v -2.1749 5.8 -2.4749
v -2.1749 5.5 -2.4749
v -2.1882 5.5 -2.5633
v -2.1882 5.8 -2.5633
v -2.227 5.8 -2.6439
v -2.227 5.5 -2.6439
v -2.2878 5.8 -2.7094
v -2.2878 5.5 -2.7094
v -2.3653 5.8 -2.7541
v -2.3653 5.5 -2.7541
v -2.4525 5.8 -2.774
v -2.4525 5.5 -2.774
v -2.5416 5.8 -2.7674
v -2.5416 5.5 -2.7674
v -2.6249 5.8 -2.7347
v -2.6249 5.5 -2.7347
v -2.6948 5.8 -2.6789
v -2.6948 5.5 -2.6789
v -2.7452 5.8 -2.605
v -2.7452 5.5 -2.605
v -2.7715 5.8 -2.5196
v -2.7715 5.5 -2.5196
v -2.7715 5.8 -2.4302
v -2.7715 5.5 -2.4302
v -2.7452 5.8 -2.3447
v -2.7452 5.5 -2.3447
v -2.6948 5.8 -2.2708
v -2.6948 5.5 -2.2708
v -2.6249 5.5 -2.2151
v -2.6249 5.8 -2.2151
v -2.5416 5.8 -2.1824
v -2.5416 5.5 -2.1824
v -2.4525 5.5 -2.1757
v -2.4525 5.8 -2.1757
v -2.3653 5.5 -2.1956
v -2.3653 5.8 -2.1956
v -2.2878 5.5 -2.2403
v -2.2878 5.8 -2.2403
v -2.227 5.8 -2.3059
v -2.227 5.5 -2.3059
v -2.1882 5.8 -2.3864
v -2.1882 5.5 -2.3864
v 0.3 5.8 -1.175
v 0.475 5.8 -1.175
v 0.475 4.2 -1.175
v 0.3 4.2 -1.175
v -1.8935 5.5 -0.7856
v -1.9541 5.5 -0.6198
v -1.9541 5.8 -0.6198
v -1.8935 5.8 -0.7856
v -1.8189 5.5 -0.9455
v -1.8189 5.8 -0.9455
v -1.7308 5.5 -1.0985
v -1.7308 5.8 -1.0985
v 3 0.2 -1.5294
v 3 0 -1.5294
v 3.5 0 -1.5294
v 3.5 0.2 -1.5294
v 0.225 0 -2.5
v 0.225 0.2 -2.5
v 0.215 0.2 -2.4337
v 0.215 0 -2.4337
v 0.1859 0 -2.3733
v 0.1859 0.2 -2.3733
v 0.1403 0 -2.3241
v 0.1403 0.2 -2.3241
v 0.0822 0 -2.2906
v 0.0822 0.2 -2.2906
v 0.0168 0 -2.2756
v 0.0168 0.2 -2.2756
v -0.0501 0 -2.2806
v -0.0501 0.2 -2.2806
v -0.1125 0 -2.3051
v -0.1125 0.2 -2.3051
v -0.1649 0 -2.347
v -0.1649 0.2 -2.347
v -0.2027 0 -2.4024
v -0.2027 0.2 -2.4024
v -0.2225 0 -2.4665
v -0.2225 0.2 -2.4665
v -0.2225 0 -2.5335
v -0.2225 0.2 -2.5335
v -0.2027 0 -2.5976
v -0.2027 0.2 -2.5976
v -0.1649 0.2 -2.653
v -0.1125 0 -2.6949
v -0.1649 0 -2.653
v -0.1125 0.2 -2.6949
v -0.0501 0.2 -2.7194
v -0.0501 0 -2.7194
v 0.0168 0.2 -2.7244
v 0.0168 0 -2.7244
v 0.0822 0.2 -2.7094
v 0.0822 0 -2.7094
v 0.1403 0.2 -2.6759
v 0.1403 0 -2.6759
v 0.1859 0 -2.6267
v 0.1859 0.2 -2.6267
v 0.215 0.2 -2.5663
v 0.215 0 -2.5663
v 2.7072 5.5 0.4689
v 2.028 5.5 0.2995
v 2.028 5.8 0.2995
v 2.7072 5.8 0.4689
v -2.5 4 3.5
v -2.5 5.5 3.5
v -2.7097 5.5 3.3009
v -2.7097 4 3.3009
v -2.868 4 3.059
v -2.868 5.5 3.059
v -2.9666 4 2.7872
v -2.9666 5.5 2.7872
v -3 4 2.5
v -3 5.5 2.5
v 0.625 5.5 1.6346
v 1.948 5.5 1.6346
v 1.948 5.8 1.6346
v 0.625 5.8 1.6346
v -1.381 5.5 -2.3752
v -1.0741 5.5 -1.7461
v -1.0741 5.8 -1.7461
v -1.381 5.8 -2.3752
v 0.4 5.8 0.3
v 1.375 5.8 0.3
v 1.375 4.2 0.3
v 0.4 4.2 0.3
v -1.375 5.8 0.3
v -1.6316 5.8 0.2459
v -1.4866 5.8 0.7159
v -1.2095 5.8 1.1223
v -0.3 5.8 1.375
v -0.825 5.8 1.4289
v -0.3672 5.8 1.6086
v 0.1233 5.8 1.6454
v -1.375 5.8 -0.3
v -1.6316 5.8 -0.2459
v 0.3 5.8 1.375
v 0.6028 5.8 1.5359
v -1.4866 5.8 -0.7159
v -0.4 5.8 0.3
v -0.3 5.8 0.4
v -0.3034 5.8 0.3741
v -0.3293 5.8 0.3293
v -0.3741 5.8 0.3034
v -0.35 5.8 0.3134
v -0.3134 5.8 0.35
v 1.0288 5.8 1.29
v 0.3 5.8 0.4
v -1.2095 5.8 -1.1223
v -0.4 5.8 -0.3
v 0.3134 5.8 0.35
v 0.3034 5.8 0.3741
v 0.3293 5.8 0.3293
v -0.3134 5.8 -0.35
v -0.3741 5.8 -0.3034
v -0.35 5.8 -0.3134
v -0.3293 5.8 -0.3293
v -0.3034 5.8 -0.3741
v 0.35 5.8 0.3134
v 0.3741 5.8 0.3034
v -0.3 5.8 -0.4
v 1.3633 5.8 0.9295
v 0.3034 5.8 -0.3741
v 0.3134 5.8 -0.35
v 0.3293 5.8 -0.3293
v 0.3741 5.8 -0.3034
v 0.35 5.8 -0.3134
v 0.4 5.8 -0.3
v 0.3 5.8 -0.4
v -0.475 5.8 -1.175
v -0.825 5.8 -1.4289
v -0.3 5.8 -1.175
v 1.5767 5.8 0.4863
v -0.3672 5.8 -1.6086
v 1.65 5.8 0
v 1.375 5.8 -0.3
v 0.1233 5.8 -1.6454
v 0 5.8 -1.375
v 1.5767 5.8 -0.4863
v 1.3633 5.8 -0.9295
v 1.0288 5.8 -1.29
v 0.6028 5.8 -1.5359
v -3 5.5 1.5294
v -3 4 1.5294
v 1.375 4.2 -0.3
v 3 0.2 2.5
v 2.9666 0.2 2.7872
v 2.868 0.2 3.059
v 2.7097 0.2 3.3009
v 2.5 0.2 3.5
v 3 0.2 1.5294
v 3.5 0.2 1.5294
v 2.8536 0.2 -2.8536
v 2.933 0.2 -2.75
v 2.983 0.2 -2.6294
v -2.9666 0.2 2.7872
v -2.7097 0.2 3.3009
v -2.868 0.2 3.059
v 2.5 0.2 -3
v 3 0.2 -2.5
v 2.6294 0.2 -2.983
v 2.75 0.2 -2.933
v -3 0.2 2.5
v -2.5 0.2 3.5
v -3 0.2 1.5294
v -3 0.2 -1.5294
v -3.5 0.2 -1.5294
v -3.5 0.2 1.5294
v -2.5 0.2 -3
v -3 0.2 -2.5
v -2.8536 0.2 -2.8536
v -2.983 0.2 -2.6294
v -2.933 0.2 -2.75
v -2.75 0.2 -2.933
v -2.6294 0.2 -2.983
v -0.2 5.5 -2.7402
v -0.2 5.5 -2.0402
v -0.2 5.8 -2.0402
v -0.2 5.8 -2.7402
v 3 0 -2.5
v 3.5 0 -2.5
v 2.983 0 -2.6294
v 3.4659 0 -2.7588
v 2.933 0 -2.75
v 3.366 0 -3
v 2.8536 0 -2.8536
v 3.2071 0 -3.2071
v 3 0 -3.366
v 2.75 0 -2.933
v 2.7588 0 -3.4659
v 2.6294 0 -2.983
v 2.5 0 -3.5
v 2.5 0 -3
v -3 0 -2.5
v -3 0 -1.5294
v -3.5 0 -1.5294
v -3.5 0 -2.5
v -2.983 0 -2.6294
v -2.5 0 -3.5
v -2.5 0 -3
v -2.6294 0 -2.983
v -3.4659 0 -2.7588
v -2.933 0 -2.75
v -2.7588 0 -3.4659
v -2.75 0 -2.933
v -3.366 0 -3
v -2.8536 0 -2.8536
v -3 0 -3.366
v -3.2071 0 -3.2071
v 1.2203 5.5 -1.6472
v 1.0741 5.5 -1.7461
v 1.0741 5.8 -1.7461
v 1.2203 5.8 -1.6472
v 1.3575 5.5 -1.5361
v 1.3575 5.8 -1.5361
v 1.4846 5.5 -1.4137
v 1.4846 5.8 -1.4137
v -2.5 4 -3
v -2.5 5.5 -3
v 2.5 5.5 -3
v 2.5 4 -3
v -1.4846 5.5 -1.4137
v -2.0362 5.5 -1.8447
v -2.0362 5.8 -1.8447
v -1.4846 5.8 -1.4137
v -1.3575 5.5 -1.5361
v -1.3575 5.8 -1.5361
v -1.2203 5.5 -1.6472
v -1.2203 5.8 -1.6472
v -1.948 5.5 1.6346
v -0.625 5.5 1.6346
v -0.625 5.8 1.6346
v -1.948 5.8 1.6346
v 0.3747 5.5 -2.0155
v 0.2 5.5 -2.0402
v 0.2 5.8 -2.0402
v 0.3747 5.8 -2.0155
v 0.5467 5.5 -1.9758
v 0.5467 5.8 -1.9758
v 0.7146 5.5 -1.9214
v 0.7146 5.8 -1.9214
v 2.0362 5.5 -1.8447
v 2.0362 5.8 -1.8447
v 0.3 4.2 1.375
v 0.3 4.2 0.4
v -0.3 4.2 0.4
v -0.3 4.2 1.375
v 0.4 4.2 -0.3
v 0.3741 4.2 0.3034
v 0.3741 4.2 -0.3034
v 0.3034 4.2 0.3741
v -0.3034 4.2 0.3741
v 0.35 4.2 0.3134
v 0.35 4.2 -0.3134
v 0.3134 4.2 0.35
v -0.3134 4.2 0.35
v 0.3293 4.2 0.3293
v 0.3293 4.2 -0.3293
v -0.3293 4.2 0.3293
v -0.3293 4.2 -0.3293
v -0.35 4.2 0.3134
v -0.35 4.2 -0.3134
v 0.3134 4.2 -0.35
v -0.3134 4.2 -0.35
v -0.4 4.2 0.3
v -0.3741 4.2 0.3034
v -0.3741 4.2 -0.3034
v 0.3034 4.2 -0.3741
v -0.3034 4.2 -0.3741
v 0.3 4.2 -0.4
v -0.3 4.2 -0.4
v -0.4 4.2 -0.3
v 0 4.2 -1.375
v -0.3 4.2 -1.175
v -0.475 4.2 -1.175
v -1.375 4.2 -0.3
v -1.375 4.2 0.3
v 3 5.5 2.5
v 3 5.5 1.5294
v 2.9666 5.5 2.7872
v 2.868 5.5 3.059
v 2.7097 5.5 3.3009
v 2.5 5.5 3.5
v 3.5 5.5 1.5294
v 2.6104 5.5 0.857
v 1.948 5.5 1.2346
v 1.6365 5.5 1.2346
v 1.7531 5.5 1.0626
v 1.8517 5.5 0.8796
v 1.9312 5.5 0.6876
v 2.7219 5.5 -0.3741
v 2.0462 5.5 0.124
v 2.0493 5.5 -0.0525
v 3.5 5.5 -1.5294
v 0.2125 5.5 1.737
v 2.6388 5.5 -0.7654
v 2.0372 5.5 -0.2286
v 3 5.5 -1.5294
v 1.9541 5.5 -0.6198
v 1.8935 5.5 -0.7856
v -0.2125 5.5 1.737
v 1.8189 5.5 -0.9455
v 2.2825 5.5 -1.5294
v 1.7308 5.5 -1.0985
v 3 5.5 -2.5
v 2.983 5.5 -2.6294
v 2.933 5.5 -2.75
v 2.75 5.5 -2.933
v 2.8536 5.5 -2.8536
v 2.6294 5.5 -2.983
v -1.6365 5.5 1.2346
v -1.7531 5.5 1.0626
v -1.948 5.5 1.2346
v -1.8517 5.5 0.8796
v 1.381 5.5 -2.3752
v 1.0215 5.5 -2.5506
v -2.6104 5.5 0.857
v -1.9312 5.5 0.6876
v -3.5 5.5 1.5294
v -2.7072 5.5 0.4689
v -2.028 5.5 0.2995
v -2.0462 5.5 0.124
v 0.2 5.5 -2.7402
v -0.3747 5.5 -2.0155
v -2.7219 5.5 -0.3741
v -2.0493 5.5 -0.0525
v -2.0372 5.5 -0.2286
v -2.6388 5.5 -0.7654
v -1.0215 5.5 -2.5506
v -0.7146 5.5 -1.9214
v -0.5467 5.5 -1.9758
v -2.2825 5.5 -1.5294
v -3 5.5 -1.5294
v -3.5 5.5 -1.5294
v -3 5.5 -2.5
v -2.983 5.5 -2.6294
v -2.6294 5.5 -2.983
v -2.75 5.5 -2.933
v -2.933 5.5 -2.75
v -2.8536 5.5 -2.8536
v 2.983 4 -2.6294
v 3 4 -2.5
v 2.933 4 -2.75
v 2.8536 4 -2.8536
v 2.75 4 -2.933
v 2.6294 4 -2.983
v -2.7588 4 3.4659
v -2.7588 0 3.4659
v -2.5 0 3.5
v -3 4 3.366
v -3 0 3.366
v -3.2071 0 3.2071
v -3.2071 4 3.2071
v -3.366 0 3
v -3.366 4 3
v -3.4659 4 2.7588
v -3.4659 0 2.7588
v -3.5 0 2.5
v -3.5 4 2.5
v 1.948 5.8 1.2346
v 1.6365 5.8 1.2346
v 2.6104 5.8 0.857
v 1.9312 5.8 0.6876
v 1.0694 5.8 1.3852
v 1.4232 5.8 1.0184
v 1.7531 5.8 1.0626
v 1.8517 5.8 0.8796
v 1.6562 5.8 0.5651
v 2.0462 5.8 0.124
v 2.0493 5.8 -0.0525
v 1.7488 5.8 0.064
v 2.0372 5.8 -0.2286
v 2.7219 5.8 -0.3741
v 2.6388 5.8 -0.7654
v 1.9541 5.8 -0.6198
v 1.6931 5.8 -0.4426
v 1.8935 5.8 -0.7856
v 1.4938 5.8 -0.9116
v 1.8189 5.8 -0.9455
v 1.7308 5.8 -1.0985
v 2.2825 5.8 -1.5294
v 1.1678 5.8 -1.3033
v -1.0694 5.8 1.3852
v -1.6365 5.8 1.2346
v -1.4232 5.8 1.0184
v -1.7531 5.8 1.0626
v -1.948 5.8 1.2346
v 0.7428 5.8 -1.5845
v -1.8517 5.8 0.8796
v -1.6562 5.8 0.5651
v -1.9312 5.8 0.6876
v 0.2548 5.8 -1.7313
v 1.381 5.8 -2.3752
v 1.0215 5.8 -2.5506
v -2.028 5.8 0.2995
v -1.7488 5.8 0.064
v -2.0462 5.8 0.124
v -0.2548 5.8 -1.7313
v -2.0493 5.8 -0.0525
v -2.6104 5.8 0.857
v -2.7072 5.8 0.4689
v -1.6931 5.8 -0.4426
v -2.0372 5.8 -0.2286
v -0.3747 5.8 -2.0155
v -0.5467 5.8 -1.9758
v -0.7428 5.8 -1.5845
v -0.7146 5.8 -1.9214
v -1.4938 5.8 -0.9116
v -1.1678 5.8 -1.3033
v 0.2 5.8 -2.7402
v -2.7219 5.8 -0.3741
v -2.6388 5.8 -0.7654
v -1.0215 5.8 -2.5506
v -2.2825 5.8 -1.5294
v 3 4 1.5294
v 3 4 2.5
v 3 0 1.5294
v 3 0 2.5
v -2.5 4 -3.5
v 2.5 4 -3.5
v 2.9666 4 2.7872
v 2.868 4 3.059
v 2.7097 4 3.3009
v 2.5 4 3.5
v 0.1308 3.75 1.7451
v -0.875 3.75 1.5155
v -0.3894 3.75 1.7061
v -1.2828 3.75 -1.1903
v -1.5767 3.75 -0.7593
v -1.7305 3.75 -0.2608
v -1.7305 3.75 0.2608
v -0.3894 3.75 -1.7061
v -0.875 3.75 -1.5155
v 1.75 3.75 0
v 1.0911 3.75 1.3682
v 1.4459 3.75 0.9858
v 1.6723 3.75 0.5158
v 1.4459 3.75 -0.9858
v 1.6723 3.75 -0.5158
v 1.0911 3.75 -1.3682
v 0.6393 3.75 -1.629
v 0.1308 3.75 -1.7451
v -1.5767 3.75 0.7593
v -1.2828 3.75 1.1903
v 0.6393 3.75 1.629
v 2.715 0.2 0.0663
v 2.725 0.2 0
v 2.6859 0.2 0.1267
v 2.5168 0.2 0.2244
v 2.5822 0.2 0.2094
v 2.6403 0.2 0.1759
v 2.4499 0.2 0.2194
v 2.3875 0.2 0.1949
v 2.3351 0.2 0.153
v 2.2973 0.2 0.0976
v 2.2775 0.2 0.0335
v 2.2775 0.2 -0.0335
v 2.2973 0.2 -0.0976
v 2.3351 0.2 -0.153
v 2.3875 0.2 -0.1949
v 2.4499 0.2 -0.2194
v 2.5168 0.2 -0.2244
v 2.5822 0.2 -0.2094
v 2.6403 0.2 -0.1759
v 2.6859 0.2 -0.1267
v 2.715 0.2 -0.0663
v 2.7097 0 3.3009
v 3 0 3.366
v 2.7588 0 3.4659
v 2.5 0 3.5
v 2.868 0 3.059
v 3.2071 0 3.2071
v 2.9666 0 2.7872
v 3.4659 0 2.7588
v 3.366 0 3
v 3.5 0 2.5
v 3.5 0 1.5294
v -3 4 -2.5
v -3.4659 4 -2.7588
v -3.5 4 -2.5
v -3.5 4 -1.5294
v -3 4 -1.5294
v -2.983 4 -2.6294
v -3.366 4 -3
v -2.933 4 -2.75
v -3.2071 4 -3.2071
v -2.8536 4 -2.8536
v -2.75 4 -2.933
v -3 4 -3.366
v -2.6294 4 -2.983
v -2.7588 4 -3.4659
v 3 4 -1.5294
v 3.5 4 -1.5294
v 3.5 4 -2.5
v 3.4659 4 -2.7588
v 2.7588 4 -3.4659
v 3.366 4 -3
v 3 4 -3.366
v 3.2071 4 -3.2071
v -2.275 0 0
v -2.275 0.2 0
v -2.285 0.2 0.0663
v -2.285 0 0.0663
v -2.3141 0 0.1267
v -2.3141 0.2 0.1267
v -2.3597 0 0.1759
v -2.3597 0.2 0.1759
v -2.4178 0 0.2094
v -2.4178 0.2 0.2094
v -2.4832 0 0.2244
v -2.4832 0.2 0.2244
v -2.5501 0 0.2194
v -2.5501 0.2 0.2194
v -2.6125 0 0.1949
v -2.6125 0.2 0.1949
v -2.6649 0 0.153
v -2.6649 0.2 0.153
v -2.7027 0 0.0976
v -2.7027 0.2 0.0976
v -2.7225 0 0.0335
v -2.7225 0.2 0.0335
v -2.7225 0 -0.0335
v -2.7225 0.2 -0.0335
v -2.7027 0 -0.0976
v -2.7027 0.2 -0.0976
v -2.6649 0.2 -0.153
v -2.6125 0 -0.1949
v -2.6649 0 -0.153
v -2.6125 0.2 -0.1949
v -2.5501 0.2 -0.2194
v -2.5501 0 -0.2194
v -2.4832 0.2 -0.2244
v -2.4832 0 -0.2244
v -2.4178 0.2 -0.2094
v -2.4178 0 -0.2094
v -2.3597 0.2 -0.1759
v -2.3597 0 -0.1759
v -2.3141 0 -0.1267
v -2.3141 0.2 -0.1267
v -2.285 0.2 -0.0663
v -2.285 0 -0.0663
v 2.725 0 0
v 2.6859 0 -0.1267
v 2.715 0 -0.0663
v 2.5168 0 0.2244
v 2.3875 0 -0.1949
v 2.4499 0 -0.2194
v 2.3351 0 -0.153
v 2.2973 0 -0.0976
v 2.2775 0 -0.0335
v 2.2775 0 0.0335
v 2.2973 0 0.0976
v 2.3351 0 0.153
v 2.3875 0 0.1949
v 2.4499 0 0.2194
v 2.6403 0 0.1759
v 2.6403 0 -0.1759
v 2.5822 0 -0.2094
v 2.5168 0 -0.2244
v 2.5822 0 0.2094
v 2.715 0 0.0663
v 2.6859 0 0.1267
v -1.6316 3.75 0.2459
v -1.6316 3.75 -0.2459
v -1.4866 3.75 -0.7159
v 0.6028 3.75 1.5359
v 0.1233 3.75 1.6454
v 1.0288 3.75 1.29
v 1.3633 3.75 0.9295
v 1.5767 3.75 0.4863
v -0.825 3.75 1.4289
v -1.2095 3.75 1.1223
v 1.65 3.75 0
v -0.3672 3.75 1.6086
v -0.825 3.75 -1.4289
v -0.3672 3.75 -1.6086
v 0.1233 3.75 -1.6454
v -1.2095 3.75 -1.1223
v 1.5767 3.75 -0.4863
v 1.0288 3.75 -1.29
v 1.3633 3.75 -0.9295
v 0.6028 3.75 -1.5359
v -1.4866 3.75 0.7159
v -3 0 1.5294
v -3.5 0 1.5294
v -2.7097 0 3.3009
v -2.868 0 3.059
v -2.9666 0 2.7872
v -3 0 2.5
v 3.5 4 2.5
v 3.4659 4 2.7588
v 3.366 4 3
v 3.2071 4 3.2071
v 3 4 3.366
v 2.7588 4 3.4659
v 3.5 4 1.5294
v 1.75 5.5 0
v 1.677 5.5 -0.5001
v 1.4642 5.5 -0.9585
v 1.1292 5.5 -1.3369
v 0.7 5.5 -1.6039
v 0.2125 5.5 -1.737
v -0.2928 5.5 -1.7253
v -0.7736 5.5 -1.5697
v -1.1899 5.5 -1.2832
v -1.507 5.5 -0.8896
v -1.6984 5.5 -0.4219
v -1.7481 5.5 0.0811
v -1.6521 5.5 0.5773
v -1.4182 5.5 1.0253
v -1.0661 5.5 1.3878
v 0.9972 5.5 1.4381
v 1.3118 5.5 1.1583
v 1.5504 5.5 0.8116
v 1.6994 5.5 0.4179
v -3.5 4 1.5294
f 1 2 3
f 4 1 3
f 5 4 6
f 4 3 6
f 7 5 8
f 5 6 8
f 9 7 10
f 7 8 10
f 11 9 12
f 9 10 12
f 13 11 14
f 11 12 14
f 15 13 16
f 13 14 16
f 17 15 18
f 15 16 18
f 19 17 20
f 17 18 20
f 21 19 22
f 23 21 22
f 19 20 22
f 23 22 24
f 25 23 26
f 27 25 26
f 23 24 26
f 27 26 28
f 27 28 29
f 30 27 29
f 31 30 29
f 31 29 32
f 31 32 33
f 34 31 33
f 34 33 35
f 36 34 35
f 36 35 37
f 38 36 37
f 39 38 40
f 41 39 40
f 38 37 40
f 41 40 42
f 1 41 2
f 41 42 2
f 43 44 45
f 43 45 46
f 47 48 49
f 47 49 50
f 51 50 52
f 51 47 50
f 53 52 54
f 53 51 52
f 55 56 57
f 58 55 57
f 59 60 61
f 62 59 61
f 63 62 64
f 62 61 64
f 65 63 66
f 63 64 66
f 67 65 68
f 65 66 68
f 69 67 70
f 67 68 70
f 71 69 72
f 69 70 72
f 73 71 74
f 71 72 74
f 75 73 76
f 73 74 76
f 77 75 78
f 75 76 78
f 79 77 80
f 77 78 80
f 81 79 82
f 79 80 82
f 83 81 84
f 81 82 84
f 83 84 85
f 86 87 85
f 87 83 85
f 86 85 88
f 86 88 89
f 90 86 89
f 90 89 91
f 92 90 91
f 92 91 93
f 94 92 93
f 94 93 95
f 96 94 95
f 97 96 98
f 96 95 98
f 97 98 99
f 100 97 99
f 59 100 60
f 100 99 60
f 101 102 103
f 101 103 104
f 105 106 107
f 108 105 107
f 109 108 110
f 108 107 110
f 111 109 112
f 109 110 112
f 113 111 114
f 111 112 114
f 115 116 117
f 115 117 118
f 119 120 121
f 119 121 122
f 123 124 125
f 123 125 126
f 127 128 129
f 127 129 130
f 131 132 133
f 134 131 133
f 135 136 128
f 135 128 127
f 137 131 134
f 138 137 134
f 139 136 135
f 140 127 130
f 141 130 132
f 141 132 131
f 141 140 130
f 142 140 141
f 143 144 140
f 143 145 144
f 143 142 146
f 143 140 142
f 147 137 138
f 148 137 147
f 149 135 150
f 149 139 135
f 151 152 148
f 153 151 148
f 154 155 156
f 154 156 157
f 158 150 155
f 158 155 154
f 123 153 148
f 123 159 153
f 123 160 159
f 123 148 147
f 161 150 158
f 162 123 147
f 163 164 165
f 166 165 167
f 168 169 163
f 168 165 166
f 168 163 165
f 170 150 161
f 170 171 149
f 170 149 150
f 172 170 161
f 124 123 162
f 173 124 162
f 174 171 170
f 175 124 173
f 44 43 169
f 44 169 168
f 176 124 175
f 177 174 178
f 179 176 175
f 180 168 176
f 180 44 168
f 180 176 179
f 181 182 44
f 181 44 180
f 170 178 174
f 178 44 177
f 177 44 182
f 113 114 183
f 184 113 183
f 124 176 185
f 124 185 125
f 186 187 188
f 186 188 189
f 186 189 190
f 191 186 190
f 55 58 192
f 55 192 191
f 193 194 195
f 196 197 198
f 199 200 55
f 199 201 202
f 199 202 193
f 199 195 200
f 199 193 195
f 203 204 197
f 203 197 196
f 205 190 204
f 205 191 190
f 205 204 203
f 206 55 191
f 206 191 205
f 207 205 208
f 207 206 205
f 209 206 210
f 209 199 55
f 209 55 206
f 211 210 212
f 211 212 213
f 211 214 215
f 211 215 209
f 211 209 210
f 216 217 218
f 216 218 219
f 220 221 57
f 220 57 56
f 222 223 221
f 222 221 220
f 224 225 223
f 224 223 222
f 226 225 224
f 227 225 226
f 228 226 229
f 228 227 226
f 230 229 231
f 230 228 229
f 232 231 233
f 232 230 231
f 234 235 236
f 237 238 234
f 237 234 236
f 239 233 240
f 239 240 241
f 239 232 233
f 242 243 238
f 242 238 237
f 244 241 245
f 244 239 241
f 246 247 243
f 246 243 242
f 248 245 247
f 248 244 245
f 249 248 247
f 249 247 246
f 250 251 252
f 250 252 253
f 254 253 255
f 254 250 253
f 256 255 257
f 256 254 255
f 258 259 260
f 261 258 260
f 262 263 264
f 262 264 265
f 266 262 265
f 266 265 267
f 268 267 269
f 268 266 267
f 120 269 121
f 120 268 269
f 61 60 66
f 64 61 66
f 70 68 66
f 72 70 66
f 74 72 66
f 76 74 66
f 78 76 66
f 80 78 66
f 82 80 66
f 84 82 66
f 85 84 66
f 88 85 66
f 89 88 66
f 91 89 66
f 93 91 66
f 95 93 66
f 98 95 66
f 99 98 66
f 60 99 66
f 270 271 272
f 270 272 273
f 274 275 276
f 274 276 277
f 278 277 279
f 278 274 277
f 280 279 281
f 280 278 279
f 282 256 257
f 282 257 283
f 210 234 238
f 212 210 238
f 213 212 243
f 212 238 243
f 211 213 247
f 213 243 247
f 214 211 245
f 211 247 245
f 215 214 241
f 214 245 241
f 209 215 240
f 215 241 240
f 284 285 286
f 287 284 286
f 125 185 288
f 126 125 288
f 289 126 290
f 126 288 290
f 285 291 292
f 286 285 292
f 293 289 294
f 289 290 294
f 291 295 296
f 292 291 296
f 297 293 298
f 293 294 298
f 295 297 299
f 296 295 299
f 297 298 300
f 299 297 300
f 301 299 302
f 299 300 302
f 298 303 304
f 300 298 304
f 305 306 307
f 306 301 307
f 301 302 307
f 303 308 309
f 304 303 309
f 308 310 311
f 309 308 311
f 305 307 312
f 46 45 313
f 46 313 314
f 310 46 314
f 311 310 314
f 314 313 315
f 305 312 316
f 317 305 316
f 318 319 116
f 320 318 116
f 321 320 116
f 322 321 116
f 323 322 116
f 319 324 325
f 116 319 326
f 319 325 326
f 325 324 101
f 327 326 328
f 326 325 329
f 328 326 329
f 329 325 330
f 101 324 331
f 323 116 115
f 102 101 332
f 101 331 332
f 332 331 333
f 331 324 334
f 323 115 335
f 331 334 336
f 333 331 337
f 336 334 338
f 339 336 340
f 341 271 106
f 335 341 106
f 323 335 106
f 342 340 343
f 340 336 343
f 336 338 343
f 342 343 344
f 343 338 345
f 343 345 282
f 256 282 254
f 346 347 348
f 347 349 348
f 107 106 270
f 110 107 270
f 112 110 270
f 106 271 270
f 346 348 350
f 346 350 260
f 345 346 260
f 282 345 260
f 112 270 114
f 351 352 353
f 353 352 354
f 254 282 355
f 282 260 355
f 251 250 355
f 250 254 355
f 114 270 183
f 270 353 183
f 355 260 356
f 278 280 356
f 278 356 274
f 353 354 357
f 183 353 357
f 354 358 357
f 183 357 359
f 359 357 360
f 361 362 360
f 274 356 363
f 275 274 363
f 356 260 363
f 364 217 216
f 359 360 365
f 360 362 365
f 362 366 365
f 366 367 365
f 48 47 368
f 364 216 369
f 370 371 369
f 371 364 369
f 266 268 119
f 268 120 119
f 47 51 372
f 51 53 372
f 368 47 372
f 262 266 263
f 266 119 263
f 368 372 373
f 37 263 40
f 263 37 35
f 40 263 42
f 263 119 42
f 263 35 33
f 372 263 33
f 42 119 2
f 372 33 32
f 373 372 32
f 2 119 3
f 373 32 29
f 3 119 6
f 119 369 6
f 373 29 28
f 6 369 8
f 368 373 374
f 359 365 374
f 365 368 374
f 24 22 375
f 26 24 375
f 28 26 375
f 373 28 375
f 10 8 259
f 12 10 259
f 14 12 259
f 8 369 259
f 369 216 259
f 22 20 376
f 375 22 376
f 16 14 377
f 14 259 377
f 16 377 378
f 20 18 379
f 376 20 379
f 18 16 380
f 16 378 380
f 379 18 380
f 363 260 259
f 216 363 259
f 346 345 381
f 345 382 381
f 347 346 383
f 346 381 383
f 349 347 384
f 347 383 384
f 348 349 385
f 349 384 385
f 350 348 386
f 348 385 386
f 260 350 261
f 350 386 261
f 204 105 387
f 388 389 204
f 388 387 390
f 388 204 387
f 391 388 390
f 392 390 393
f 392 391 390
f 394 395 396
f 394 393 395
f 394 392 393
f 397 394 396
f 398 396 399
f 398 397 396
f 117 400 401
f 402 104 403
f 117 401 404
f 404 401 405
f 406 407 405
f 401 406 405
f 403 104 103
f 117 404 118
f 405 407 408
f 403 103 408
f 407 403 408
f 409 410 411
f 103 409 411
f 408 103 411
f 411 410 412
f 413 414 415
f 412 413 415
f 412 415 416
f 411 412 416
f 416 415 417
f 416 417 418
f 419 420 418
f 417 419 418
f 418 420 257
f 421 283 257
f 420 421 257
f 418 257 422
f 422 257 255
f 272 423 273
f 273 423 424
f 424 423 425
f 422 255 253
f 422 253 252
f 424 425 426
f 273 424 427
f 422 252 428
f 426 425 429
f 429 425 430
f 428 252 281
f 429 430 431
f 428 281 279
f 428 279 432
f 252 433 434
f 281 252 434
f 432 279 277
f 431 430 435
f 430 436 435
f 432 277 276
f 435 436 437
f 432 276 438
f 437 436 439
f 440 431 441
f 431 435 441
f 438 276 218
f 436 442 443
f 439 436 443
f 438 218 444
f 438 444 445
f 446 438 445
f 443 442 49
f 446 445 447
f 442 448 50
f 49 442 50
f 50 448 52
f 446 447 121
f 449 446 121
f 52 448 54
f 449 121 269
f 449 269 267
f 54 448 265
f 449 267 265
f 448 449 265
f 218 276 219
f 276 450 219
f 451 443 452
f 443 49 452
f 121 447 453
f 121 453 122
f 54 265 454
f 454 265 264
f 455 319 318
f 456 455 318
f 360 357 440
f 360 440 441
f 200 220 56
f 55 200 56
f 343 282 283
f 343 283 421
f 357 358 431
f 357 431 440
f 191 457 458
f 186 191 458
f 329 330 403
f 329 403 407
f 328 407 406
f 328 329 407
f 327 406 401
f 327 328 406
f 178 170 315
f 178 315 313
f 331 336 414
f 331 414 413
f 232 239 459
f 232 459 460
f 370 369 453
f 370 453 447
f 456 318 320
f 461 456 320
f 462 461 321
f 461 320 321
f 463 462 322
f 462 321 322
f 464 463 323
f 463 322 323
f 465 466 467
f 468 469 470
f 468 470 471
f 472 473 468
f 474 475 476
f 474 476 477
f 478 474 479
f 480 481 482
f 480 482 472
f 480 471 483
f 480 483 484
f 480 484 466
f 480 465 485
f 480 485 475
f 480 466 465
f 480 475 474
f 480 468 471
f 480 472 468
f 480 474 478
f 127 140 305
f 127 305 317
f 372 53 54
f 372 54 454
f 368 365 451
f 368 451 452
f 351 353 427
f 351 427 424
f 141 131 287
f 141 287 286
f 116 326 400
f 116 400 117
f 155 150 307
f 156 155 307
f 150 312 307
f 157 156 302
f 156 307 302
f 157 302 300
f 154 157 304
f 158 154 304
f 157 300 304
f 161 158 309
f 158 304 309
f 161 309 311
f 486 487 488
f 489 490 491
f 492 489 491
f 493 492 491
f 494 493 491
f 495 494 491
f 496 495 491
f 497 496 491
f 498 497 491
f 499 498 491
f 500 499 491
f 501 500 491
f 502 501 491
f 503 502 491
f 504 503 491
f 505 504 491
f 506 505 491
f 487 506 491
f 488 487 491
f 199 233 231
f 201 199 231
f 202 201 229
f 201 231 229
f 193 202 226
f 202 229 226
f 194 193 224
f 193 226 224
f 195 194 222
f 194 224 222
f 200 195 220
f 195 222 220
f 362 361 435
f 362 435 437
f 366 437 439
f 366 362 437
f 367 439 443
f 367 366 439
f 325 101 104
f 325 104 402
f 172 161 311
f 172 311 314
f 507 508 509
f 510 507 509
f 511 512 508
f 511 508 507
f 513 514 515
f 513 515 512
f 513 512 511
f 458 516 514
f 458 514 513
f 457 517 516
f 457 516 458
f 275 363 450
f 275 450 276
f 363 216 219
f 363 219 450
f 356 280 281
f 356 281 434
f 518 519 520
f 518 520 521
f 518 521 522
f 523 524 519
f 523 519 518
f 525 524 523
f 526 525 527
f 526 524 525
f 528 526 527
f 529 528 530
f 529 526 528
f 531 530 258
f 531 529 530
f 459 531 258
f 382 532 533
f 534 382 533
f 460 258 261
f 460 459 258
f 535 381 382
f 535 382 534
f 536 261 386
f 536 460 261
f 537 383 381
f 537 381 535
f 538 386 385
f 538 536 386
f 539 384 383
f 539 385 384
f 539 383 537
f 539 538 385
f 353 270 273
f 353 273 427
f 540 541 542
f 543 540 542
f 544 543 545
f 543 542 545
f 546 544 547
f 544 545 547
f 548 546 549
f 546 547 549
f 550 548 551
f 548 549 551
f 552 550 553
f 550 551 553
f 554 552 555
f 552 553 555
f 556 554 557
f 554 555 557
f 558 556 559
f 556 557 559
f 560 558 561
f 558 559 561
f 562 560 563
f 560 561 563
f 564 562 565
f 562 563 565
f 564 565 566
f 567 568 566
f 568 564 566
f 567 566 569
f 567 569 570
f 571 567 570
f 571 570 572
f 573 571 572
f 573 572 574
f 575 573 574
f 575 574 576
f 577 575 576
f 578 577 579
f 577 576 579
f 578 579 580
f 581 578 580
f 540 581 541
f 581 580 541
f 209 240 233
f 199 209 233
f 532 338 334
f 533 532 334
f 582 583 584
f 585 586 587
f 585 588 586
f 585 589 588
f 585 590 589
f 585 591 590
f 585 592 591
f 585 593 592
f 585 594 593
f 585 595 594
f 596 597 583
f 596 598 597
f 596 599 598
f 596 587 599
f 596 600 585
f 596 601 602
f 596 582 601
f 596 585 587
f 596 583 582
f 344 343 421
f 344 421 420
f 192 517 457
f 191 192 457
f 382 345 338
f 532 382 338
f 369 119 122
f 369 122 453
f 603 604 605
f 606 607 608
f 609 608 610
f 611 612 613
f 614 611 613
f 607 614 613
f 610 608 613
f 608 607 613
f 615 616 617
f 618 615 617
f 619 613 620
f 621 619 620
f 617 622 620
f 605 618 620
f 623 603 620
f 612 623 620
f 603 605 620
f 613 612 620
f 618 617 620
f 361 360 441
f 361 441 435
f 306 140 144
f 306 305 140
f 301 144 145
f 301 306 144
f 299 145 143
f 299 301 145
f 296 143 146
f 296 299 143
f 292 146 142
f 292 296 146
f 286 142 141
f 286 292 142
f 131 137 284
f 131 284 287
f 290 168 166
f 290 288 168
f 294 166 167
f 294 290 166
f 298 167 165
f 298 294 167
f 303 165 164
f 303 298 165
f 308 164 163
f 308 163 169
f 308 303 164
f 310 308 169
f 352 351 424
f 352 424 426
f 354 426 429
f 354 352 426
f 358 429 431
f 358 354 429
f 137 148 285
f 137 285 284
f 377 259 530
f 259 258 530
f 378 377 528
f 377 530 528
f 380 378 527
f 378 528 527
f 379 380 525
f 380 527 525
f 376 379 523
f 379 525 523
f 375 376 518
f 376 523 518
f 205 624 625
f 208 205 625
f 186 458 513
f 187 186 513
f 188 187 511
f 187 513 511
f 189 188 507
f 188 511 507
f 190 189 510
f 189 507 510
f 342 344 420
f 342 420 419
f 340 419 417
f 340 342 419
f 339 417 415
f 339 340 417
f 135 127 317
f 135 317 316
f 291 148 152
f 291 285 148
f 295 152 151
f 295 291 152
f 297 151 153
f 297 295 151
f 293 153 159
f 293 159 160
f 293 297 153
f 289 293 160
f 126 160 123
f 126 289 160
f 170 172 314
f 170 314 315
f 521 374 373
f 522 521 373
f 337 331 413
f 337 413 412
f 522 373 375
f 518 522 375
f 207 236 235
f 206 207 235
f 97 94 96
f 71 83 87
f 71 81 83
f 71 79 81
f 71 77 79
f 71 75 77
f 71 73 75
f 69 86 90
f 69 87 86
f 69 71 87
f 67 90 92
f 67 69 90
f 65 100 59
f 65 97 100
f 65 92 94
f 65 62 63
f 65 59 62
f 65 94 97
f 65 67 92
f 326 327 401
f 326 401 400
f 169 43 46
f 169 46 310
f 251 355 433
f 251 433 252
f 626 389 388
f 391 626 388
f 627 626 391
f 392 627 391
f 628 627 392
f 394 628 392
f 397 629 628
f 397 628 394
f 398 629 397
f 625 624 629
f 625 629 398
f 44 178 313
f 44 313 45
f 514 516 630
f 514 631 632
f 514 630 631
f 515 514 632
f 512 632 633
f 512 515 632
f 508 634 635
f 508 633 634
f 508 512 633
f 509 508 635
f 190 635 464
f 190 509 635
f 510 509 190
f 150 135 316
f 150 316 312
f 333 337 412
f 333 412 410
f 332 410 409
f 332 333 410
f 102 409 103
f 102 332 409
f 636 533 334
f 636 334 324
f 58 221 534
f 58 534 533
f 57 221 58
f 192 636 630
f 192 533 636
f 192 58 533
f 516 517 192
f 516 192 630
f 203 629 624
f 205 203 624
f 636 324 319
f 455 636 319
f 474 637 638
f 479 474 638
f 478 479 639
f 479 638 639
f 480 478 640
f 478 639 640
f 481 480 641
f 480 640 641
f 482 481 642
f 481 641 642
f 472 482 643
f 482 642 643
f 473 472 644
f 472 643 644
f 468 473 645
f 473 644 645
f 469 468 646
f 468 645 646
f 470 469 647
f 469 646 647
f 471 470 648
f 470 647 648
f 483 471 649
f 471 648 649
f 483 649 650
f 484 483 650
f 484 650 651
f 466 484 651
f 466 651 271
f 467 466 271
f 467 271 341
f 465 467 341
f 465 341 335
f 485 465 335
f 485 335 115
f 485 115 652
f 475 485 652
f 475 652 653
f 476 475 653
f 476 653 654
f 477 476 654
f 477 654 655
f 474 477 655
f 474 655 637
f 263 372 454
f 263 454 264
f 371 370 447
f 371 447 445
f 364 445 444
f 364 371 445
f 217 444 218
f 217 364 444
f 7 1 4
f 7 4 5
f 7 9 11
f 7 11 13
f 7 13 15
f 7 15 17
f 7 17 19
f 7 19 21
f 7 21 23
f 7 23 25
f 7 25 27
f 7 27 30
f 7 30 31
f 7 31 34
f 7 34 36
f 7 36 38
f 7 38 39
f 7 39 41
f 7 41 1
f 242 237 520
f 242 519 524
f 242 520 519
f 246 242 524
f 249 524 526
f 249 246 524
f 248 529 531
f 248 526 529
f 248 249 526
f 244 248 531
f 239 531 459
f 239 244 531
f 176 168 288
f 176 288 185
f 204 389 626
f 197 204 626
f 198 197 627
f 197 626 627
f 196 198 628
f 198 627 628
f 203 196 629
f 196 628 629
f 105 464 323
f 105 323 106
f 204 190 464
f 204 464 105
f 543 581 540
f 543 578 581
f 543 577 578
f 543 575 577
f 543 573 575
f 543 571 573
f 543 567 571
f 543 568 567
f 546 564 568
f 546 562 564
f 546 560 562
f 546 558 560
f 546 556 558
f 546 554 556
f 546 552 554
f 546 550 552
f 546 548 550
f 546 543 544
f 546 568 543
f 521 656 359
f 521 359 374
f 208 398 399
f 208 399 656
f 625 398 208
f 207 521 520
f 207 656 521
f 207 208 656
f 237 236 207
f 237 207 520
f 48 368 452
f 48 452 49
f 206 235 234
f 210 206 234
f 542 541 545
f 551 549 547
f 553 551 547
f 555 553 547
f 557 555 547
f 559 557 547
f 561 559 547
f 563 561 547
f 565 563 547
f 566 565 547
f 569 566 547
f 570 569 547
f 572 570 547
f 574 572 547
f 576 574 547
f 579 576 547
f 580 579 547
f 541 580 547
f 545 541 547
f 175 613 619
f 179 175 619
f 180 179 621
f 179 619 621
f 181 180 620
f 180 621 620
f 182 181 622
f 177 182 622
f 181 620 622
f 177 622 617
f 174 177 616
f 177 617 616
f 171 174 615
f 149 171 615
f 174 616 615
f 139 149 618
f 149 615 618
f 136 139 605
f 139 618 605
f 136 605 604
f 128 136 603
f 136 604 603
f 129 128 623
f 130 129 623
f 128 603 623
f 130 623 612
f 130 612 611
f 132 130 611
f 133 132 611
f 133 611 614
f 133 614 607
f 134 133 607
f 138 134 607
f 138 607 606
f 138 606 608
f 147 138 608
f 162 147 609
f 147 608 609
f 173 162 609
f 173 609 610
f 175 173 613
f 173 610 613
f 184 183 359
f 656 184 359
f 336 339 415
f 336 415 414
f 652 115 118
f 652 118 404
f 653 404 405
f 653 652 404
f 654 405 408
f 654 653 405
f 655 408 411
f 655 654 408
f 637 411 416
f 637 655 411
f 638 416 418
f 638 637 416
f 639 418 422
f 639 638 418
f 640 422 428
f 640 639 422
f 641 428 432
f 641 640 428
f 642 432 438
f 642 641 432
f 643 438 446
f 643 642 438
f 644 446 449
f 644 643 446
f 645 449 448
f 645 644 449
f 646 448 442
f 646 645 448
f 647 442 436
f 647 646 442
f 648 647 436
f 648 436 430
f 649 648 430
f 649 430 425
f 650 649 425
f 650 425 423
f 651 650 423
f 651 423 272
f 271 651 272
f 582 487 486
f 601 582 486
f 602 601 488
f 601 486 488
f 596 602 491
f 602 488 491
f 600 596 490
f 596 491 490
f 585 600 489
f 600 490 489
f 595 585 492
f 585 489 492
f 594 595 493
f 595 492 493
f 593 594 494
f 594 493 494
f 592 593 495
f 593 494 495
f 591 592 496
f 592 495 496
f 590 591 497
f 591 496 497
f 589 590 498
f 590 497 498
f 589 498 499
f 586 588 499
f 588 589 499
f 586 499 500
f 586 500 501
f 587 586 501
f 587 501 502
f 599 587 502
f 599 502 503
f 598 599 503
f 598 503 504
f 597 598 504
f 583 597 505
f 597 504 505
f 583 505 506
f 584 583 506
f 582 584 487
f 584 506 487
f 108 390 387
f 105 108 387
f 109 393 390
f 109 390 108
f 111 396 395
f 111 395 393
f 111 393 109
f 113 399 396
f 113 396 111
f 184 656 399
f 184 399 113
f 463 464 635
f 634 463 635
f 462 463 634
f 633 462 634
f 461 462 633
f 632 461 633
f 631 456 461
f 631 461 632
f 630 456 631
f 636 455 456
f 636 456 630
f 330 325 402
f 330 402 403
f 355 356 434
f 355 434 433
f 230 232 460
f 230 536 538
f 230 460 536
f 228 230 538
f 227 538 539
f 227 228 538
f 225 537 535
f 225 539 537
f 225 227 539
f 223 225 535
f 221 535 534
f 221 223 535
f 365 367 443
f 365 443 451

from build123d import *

# Parameters (mm, degrees)
BOSS_EXTRUDE1_DEPTH             = 5.5
SKETCH3_R                       = 1.75
CUT_EXTRUDE1_DEPTH              = 1.75
SKETCH4_R                       = 1.65
BOSS_EXTRUDE2_DEPTH             = 2.05
CUT_EXTRUDE2_DEPTH              = 1.6
FILLET1_R                       = 0.1
BOSS_EXTRUDE3_DEPTH             = 0.3
SKETCH7_R                       = 0.3
BOSS_EXTRUDE4_DEPTH             = 0.3
CUT_EXTRUDE3_DEPTH              = 1.5
FILLET2_R                       = 0.5
CUT_EXTRUDE7_DEPTH              = 0.2
SKETCH11_R                      = 0.225
BOSS_EXTRUDE6_DEPTH             = 7.2
BOSS_EXTRUDE6_2_DEPTH           = 7.2
BOSS_EXTRUDE6_3_DEPTH           = 7.2
SKIZZE2_W                       = 11.62513836
SKIZZE2_H                       = 10.386388006
SCHNITT_LINEAR_AUSTRAGEN1_DEPTH = 7


with BuildPart() as part:
    # Sketch1 → Boss-Extrude1 (new body)
    with BuildSketch(Plane(origin=(0, 0, 0), x_dir=(1, 0, 0), z_dir=(0, 1, 0))):
        with BuildLine():
            Line((2.5, -3.5), (-2.5, -3.5))
            ThreePointArc((-2.5, -3.5), (-3.207106781, -3.207106781), (-3.5, -2.5))
            Line((-3.5, -2.5), (-3.5, 2.5))
            ThreePointArc((-3.5, 2.5), (-3.207106781, 3.207106781), (-2.5, 3.5))
            Line((-2.5, 3.5), (2.5, 3.5))
            ThreePointArc((2.5, 3.5), (3.207106781, 3.207106781), (3.5, 2.5))
            Line((3.5, 2.5), (3.5, -2.5))
            ThreePointArc((3.5, -2.5), (3.207106781, -3.207106781), (2.5, -3.5))
        make_face()
    extrude(amount=BOSS_EXTRUDE1_DEPTH)

    # Sketch3 → Cut-Extrude1 (cut)
    with BuildSketch(Plane(origin=(0, 5.5, 0), x_dir=(1, 0, 0), z_dir=(0, 1, 0))):
        Circle(SKETCH3_R)
    extrude(amount=-CUT_EXTRUDE1_DEPTH, mode=Mode.SUBTRACT)

    # Sketch6 → Boss-Extrude3 (add)
    with BuildSketch(Plane(origin=(0, 5.5, 0), x_dir=(1, 0, 0), z_dir=(0, 1, 0))):
        with BuildLine():
            Line((-0.625, -1.634587104), (-1.948025053, -1.634587104))
            Line((-1.948025053, -1.634587104), (-1.948025053, -1.234587104))
            Line((-1.948025053, -1.234587104), (-1.636549627, -1.234587104))
            ThreePointArc((-1.636549627, -1.234587104), (-1.804732041, -0.972338553), (-1.931232927, -0.687633175))
            Line((-1.931232927, -0.687633175), (-2.610439935, -0.856978501))
            Line((-2.610439935, -0.856978501), (-2.707208693, -0.468860211))
            Line((-2.707208693, -0.468860211), (-2.028001685, -0.299514884))
            ThreePointArc((-2.028001685, -0.299514884), (-2.049687775, -0.035777433), (-2.0372192, 0.22855619))
            Line((-2.0372192, 0.22855619), (-2.72192252, 0.374094373))
            Line((-2.72192252, 0.374094373), (-2.638757844, 0.765353413))
            Line((-2.638757844, 0.765353413), (-1.954054524, 0.61981523))
            ThreePointArc((-1.954054524, 0.61981523), (-1.857930963, 0.866367437), (-1.730848049, 1.098483059))
            Line((-1.730848049, 1.098483059), (-2.282455576, 1.529446092))
            Line((-2.282455576, 1.529446092), (-2.036190986, 1.844650393))
            Line((-2.036190986, 1.844650393), (-1.484583459, 1.413687361))
            ThreePointArc((-1.484583459, 1.413687361), (-1.290106802, 1.593149221), (-1.074132643, 1.746063878))
            Line((-1.074132643, 1.746063878), (-1.380992446, 2.37521971))
            Line((-1.380992446, 2.37521971), (-1.021474827, 2.550568169))
            Line((-1.021474827, 2.550568169), (-0.714615024, 1.921412336))
            ThreePointArc((-0.714615024, 1.921412336), (-0.461149661, 1.997458633), (-0.2, 2.040220576))
            Line((-0.2, 2.040220576), (-0.2, 2.740220576))
            Line((-0.2, 2.740220576), (0.2, 2.740220576))
            Line((0.2, 2.740220576), (0.2, 2.040220576))
            ThreePointArc((0.2, 2.040220576), (0.461149661, 1.997458633), (0.714615024, 1.921412336))
            Line((0.714615024, 1.921412336), (1.021474827, 2.550568169))
            Line((1.021474827, 2.550568169), (1.380992446, 2.37521971))
            Line((1.380992446, 2.37521971), (1.074132643, 1.746063878))
            ThreePointArc((1.074132643, 1.746063878), (1.290106802, 1.593149221), (1.484583459, 1.413687361))
            Line((1.484583459, 1.413687361), (2.036190986, 1.844650393))
            Line((2.036190986, 1.844650393), (2.282455576, 1.529446092))
            Line((2.282455576, 1.529446092), (1.730848049, 1.098483059))
            ThreePointArc((1.730848049, 1.098483059), (1.857930963, 0.866367437), (1.954054524, 0.61981523))
            Line((1.954054524, 0.61981523), (2.638757844, 0.765353413))
            Line((2.638757844, 0.765353413), (2.72192252, 0.374094373))
            Line((2.72192252, 0.374094373), (2.0372192, 0.22855619))
            ThreePointArc((2.0372192, 0.22855619), (2.049687775, -0.035777433), (2.028001685, -0.299514884))
            Line((2.028001685, -0.299514884), (2.707208693, -0.468860211))
            Line((2.707208693, -0.468860211), (2.610439935, -0.856978501))
            Line((2.610439935, -0.856978501), (1.931232927, -0.687633175))
            ThreePointArc((1.931232927, -0.687633175), (1.804732041, -0.972338553), (1.636549627, -1.234587104))
            Line((1.636549627, -1.234587104), (1.948025053, -1.234587104))
            Line((1.948025053, -1.234587104), (1.948025053, -1.634587104))
            Line((1.948025053, -1.634587104), (0.625, -1.634587104))
            ThreePointArc((0.625, -1.634587104), (0, 1.75), (-0.625, -1.634587104))
        make_face()
    extrude(amount=BOSS_EXTRUDE3_DEPTH)

    # Sketch7 → Boss-Extrude4 (add)
    with BuildSketch(Plane(origin=(0, 5.5, 0), x_dir=(1, 0, 0), z_dir=(0, 1, 0))):
        with Locations((-2.474873734, 2.474873734)):
            Circle(SKETCH7_R)
    extrude(amount=BOSS_EXTRUDE4_DEPTH)

    # Sketch2 → Cut-Extrude3 (cut)
    with BuildSketch(Plane(origin=(0, 5.5, 0), x_dir=(1, 0, 0), z_dir=(0, 1, 0))):
        with BuildLine():
            ThreePointArc((-3.5, -2.5), (-3.207106781, -3.207106781), (-2.5, -3.5))
            ThreePointArc((-2.5, -3.5), (-2.868033989, -3.059016994), (-3, -2.5))
            Line((-3, -2.5), (-3, -1.529446092))
            Line((-3, -1.529446092), (-3.5, -1.529446092))
            Line((-3.5, -1.529446092), (-3.5, -2.5))
        make_face()
        with BuildLine():
            ThreePointArc((2.5, -3.5), (3.207106781, -3.207106781), (3.5, -2.5))
            Line((3.5, -2.5), (3.5, -1.529446092))
            Line((3.5, -1.529446092), (3, -1.529446092))
            Line((3, -1.529446092), (3, -2.5))
            ThreePointArc((3, -2.5), (2.868033989, -3.059016994), (2.5, -3.5))
        make_face()
        with BuildLine():
            Line((3, 1.529446092), (3.5, 1.529446092))
            Line((3.5, 1.529446092), (3.5, 2.5))
            ThreePointArc((3.5, 2.5), (3.207106781, 3.207106781), (2.5, 3.5))
            Line((2.5, 3.5), (-2.5, 3.5))
            ThreePointArc((-2.5, 3.5), (-3.207106781, 3.207106781), (-3.5, 2.5))
            Line((-3.5, 2.5), (-3.5, 1.529446092))
            Line((-3.5, 1.529446092), (-3, 1.529446092))
            Line((-3, 1.529446092), (-3, 3))
            Line((-3, 3), (3, 3))
            Line((3, 3), (3, 1.529446092))
        make_face()
    extrude(amount=-CUT_EXTRUDE3_DEPTH, mode=Mode.SUBTRACT)

    # Fillet2
    fillet2_edges = [part.edges().sort_by_distance(p)[0] for p in [
        (3, 4.75, -3),
        (-3, 4.75, -3),
    ]]
    fillet(fillet2_edges, radius=FILLET2_R)

    # Sketch10 → Cut-Extrude7 (cut)
    with BuildSketch(Plane(origin=(0, 0, 0), x_dir=(1, 0, 0), z_dir=(0, 1, 0))):
        with BuildLine():
            Line((3, 2.5), (3, 1.529446092))
            Line((3, 1.529446092), (3.5, 1.529446092))
            Line((3.5, 1.529446092), (3.5, -1.529446092))
            Line((3.5, -1.529446092), (3, -1.529446092))
            Line((3, -1.529446092), (3, -2.5))
            ThreePointArc((3, -2.5), (2.868033989, -3.059016994), (2.5, -3.5))
            Line((2.5, -3.5), (-2.5, -3.5))
            ThreePointArc((-2.5, -3.5), (-2.868033989, -3.059016994), (-3, -2.5))
            Line((-3, -2.5), (-3, -1.529446092))
            Line((-3, -1.529446092), (-3.5, -1.529446092))
            Line((-3.5, -1.529446092), (-3.5, 1.529446092))
            Line((-3.5, 1.529446092), (-3, 1.529446092))
            Line((-3, 1.529446092), (-3, 2.5))
            ThreePointArc((-3, 2.5), (-2.853553391, 2.853553391), (-2.5, 3))
            Line((-2.5, 3), (2.5, 3))
            ThreePointArc((2.5, 3), (2.853553391, 2.853553391), (3, 2.5))
        make_face()
    extrude(amount=CUT_EXTRUDE7_DEPTH, mode=Mode.SUBTRACT)


with BuildPart() as body_2:
    # Sketch4 → Boss-Extrude2 (new body)
    with BuildSketch(Plane(origin=(0, 3.75, 0), x_dir=(1, 0, 0), z_dir=(0, 1, 0))):
        Circle(SKETCH4_R)
    extrude(amount=BOSS_EXTRUDE2_DEPTH)

    # Sketch5 → Cut-Extrude2 (cut)
    with BuildSketch(Plane(origin=(0, 5.8, 0), x_dir=(1, 0, 0), z_dir=(0, 1, 0))):
        Polygon((-0.3, 0.3), (-0.3, 1.175), (-0.475, 1.175), (0, 1.375), (0.475, 1.175), (0.3, 1.175), (0.3, 0.3), (1.375, 0.3), (1.375, -0.3), (0.3, -0.3), (0.3, -1.375), (-0.3, -1.375), (-0.3, -0.3), (-1.375, -0.3), (-1.375, 0.3), align=None)
    extrude(amount=-CUT_EXTRUDE2_DEPTH, mode=Mode.SUBTRACT)

    # Fillet1
    fillet1_edges = [body_2.edges().sort_by_distance(p)[0] for p in [
        (-0.3, 5, -0.3),
        (0.3, 5, -0.3),
        (0.3, 5, 0.3),
        (-0.3, 5, 0.3),
    ]]
    fillet(fillet1_edges, radius=FILLET1_R)


with BuildPart() as body_3:
    # Sketch11 → Boss-Extrude6 (new body)
    with BuildSketch(Plane.XZ.offset(-0.2)):
        with Locations((2.5, 0)):
            Circle(SKETCH11_R)
    extrude(amount=BOSS_EXTRUDE6_DEPTH)


with BuildPart() as body_4:
    # Sketch11 → Boss-Extrude6 2 (new body)
    with BuildSketch(Plane.XZ.offset(-0.2)):
        with Locations((0, -2.5)):
            Circle(SKETCH11_R)
    extrude(amount=BOSS_EXTRUDE6_2_DEPTH)


with BuildPart() as body_5:
    # Sketch11 → Boss-Extrude6 3 (new body)
    with BuildSketch(Plane.XZ.offset(-0.2)):
        with Locations((-2.5, 0)):
            Circle(SKETCH11_R)
    extrude(amount=BOSS_EXTRUDE6_3_DEPTH)


with BuildPart() as schnitt_linear_austragen1_tool:
    # Skizze2 → Schnitt-Linear austragen1 (new body)
    with BuildSketch(Plane.XZ.offset(7)):
        with Locations((-1.384709973, -1.375039125)):
            Rectangle(SKIZZE2_W, SKIZZE2_H)
    extrude(amount=-SCHNITT_LINEAR_AUSTRAGEN1_DEPTH)


with BuildPart() as body_3_1:
    add(body_3.part)

    # Schnitt-Linear austragen1: cut by schnitt_linear_austragen1_tool
    add(schnitt_linear_austragen1_tool.part, mode=Mode.SUBTRACT)


with BuildPart() as body_4_1:
    add(body_4.part)

    # Schnitt-Linear austragen1: cut by schnitt_linear_austragen1_tool
    add(schnitt_linear_austragen1_tool.part, mode=Mode.SUBTRACT)


with BuildPart() as body_5_1:
    add(body_5.part)

    # Schnitt-Linear austragen1: cut by schnitt_linear_austragen1_tool
    add(schnitt_linear_austragen1_tool.part, mode=Mode.SUBTRACT)


solid = Compound([part.part, body_2.part, body_3_1.part, body_4_1.part, body_5_1.part])
